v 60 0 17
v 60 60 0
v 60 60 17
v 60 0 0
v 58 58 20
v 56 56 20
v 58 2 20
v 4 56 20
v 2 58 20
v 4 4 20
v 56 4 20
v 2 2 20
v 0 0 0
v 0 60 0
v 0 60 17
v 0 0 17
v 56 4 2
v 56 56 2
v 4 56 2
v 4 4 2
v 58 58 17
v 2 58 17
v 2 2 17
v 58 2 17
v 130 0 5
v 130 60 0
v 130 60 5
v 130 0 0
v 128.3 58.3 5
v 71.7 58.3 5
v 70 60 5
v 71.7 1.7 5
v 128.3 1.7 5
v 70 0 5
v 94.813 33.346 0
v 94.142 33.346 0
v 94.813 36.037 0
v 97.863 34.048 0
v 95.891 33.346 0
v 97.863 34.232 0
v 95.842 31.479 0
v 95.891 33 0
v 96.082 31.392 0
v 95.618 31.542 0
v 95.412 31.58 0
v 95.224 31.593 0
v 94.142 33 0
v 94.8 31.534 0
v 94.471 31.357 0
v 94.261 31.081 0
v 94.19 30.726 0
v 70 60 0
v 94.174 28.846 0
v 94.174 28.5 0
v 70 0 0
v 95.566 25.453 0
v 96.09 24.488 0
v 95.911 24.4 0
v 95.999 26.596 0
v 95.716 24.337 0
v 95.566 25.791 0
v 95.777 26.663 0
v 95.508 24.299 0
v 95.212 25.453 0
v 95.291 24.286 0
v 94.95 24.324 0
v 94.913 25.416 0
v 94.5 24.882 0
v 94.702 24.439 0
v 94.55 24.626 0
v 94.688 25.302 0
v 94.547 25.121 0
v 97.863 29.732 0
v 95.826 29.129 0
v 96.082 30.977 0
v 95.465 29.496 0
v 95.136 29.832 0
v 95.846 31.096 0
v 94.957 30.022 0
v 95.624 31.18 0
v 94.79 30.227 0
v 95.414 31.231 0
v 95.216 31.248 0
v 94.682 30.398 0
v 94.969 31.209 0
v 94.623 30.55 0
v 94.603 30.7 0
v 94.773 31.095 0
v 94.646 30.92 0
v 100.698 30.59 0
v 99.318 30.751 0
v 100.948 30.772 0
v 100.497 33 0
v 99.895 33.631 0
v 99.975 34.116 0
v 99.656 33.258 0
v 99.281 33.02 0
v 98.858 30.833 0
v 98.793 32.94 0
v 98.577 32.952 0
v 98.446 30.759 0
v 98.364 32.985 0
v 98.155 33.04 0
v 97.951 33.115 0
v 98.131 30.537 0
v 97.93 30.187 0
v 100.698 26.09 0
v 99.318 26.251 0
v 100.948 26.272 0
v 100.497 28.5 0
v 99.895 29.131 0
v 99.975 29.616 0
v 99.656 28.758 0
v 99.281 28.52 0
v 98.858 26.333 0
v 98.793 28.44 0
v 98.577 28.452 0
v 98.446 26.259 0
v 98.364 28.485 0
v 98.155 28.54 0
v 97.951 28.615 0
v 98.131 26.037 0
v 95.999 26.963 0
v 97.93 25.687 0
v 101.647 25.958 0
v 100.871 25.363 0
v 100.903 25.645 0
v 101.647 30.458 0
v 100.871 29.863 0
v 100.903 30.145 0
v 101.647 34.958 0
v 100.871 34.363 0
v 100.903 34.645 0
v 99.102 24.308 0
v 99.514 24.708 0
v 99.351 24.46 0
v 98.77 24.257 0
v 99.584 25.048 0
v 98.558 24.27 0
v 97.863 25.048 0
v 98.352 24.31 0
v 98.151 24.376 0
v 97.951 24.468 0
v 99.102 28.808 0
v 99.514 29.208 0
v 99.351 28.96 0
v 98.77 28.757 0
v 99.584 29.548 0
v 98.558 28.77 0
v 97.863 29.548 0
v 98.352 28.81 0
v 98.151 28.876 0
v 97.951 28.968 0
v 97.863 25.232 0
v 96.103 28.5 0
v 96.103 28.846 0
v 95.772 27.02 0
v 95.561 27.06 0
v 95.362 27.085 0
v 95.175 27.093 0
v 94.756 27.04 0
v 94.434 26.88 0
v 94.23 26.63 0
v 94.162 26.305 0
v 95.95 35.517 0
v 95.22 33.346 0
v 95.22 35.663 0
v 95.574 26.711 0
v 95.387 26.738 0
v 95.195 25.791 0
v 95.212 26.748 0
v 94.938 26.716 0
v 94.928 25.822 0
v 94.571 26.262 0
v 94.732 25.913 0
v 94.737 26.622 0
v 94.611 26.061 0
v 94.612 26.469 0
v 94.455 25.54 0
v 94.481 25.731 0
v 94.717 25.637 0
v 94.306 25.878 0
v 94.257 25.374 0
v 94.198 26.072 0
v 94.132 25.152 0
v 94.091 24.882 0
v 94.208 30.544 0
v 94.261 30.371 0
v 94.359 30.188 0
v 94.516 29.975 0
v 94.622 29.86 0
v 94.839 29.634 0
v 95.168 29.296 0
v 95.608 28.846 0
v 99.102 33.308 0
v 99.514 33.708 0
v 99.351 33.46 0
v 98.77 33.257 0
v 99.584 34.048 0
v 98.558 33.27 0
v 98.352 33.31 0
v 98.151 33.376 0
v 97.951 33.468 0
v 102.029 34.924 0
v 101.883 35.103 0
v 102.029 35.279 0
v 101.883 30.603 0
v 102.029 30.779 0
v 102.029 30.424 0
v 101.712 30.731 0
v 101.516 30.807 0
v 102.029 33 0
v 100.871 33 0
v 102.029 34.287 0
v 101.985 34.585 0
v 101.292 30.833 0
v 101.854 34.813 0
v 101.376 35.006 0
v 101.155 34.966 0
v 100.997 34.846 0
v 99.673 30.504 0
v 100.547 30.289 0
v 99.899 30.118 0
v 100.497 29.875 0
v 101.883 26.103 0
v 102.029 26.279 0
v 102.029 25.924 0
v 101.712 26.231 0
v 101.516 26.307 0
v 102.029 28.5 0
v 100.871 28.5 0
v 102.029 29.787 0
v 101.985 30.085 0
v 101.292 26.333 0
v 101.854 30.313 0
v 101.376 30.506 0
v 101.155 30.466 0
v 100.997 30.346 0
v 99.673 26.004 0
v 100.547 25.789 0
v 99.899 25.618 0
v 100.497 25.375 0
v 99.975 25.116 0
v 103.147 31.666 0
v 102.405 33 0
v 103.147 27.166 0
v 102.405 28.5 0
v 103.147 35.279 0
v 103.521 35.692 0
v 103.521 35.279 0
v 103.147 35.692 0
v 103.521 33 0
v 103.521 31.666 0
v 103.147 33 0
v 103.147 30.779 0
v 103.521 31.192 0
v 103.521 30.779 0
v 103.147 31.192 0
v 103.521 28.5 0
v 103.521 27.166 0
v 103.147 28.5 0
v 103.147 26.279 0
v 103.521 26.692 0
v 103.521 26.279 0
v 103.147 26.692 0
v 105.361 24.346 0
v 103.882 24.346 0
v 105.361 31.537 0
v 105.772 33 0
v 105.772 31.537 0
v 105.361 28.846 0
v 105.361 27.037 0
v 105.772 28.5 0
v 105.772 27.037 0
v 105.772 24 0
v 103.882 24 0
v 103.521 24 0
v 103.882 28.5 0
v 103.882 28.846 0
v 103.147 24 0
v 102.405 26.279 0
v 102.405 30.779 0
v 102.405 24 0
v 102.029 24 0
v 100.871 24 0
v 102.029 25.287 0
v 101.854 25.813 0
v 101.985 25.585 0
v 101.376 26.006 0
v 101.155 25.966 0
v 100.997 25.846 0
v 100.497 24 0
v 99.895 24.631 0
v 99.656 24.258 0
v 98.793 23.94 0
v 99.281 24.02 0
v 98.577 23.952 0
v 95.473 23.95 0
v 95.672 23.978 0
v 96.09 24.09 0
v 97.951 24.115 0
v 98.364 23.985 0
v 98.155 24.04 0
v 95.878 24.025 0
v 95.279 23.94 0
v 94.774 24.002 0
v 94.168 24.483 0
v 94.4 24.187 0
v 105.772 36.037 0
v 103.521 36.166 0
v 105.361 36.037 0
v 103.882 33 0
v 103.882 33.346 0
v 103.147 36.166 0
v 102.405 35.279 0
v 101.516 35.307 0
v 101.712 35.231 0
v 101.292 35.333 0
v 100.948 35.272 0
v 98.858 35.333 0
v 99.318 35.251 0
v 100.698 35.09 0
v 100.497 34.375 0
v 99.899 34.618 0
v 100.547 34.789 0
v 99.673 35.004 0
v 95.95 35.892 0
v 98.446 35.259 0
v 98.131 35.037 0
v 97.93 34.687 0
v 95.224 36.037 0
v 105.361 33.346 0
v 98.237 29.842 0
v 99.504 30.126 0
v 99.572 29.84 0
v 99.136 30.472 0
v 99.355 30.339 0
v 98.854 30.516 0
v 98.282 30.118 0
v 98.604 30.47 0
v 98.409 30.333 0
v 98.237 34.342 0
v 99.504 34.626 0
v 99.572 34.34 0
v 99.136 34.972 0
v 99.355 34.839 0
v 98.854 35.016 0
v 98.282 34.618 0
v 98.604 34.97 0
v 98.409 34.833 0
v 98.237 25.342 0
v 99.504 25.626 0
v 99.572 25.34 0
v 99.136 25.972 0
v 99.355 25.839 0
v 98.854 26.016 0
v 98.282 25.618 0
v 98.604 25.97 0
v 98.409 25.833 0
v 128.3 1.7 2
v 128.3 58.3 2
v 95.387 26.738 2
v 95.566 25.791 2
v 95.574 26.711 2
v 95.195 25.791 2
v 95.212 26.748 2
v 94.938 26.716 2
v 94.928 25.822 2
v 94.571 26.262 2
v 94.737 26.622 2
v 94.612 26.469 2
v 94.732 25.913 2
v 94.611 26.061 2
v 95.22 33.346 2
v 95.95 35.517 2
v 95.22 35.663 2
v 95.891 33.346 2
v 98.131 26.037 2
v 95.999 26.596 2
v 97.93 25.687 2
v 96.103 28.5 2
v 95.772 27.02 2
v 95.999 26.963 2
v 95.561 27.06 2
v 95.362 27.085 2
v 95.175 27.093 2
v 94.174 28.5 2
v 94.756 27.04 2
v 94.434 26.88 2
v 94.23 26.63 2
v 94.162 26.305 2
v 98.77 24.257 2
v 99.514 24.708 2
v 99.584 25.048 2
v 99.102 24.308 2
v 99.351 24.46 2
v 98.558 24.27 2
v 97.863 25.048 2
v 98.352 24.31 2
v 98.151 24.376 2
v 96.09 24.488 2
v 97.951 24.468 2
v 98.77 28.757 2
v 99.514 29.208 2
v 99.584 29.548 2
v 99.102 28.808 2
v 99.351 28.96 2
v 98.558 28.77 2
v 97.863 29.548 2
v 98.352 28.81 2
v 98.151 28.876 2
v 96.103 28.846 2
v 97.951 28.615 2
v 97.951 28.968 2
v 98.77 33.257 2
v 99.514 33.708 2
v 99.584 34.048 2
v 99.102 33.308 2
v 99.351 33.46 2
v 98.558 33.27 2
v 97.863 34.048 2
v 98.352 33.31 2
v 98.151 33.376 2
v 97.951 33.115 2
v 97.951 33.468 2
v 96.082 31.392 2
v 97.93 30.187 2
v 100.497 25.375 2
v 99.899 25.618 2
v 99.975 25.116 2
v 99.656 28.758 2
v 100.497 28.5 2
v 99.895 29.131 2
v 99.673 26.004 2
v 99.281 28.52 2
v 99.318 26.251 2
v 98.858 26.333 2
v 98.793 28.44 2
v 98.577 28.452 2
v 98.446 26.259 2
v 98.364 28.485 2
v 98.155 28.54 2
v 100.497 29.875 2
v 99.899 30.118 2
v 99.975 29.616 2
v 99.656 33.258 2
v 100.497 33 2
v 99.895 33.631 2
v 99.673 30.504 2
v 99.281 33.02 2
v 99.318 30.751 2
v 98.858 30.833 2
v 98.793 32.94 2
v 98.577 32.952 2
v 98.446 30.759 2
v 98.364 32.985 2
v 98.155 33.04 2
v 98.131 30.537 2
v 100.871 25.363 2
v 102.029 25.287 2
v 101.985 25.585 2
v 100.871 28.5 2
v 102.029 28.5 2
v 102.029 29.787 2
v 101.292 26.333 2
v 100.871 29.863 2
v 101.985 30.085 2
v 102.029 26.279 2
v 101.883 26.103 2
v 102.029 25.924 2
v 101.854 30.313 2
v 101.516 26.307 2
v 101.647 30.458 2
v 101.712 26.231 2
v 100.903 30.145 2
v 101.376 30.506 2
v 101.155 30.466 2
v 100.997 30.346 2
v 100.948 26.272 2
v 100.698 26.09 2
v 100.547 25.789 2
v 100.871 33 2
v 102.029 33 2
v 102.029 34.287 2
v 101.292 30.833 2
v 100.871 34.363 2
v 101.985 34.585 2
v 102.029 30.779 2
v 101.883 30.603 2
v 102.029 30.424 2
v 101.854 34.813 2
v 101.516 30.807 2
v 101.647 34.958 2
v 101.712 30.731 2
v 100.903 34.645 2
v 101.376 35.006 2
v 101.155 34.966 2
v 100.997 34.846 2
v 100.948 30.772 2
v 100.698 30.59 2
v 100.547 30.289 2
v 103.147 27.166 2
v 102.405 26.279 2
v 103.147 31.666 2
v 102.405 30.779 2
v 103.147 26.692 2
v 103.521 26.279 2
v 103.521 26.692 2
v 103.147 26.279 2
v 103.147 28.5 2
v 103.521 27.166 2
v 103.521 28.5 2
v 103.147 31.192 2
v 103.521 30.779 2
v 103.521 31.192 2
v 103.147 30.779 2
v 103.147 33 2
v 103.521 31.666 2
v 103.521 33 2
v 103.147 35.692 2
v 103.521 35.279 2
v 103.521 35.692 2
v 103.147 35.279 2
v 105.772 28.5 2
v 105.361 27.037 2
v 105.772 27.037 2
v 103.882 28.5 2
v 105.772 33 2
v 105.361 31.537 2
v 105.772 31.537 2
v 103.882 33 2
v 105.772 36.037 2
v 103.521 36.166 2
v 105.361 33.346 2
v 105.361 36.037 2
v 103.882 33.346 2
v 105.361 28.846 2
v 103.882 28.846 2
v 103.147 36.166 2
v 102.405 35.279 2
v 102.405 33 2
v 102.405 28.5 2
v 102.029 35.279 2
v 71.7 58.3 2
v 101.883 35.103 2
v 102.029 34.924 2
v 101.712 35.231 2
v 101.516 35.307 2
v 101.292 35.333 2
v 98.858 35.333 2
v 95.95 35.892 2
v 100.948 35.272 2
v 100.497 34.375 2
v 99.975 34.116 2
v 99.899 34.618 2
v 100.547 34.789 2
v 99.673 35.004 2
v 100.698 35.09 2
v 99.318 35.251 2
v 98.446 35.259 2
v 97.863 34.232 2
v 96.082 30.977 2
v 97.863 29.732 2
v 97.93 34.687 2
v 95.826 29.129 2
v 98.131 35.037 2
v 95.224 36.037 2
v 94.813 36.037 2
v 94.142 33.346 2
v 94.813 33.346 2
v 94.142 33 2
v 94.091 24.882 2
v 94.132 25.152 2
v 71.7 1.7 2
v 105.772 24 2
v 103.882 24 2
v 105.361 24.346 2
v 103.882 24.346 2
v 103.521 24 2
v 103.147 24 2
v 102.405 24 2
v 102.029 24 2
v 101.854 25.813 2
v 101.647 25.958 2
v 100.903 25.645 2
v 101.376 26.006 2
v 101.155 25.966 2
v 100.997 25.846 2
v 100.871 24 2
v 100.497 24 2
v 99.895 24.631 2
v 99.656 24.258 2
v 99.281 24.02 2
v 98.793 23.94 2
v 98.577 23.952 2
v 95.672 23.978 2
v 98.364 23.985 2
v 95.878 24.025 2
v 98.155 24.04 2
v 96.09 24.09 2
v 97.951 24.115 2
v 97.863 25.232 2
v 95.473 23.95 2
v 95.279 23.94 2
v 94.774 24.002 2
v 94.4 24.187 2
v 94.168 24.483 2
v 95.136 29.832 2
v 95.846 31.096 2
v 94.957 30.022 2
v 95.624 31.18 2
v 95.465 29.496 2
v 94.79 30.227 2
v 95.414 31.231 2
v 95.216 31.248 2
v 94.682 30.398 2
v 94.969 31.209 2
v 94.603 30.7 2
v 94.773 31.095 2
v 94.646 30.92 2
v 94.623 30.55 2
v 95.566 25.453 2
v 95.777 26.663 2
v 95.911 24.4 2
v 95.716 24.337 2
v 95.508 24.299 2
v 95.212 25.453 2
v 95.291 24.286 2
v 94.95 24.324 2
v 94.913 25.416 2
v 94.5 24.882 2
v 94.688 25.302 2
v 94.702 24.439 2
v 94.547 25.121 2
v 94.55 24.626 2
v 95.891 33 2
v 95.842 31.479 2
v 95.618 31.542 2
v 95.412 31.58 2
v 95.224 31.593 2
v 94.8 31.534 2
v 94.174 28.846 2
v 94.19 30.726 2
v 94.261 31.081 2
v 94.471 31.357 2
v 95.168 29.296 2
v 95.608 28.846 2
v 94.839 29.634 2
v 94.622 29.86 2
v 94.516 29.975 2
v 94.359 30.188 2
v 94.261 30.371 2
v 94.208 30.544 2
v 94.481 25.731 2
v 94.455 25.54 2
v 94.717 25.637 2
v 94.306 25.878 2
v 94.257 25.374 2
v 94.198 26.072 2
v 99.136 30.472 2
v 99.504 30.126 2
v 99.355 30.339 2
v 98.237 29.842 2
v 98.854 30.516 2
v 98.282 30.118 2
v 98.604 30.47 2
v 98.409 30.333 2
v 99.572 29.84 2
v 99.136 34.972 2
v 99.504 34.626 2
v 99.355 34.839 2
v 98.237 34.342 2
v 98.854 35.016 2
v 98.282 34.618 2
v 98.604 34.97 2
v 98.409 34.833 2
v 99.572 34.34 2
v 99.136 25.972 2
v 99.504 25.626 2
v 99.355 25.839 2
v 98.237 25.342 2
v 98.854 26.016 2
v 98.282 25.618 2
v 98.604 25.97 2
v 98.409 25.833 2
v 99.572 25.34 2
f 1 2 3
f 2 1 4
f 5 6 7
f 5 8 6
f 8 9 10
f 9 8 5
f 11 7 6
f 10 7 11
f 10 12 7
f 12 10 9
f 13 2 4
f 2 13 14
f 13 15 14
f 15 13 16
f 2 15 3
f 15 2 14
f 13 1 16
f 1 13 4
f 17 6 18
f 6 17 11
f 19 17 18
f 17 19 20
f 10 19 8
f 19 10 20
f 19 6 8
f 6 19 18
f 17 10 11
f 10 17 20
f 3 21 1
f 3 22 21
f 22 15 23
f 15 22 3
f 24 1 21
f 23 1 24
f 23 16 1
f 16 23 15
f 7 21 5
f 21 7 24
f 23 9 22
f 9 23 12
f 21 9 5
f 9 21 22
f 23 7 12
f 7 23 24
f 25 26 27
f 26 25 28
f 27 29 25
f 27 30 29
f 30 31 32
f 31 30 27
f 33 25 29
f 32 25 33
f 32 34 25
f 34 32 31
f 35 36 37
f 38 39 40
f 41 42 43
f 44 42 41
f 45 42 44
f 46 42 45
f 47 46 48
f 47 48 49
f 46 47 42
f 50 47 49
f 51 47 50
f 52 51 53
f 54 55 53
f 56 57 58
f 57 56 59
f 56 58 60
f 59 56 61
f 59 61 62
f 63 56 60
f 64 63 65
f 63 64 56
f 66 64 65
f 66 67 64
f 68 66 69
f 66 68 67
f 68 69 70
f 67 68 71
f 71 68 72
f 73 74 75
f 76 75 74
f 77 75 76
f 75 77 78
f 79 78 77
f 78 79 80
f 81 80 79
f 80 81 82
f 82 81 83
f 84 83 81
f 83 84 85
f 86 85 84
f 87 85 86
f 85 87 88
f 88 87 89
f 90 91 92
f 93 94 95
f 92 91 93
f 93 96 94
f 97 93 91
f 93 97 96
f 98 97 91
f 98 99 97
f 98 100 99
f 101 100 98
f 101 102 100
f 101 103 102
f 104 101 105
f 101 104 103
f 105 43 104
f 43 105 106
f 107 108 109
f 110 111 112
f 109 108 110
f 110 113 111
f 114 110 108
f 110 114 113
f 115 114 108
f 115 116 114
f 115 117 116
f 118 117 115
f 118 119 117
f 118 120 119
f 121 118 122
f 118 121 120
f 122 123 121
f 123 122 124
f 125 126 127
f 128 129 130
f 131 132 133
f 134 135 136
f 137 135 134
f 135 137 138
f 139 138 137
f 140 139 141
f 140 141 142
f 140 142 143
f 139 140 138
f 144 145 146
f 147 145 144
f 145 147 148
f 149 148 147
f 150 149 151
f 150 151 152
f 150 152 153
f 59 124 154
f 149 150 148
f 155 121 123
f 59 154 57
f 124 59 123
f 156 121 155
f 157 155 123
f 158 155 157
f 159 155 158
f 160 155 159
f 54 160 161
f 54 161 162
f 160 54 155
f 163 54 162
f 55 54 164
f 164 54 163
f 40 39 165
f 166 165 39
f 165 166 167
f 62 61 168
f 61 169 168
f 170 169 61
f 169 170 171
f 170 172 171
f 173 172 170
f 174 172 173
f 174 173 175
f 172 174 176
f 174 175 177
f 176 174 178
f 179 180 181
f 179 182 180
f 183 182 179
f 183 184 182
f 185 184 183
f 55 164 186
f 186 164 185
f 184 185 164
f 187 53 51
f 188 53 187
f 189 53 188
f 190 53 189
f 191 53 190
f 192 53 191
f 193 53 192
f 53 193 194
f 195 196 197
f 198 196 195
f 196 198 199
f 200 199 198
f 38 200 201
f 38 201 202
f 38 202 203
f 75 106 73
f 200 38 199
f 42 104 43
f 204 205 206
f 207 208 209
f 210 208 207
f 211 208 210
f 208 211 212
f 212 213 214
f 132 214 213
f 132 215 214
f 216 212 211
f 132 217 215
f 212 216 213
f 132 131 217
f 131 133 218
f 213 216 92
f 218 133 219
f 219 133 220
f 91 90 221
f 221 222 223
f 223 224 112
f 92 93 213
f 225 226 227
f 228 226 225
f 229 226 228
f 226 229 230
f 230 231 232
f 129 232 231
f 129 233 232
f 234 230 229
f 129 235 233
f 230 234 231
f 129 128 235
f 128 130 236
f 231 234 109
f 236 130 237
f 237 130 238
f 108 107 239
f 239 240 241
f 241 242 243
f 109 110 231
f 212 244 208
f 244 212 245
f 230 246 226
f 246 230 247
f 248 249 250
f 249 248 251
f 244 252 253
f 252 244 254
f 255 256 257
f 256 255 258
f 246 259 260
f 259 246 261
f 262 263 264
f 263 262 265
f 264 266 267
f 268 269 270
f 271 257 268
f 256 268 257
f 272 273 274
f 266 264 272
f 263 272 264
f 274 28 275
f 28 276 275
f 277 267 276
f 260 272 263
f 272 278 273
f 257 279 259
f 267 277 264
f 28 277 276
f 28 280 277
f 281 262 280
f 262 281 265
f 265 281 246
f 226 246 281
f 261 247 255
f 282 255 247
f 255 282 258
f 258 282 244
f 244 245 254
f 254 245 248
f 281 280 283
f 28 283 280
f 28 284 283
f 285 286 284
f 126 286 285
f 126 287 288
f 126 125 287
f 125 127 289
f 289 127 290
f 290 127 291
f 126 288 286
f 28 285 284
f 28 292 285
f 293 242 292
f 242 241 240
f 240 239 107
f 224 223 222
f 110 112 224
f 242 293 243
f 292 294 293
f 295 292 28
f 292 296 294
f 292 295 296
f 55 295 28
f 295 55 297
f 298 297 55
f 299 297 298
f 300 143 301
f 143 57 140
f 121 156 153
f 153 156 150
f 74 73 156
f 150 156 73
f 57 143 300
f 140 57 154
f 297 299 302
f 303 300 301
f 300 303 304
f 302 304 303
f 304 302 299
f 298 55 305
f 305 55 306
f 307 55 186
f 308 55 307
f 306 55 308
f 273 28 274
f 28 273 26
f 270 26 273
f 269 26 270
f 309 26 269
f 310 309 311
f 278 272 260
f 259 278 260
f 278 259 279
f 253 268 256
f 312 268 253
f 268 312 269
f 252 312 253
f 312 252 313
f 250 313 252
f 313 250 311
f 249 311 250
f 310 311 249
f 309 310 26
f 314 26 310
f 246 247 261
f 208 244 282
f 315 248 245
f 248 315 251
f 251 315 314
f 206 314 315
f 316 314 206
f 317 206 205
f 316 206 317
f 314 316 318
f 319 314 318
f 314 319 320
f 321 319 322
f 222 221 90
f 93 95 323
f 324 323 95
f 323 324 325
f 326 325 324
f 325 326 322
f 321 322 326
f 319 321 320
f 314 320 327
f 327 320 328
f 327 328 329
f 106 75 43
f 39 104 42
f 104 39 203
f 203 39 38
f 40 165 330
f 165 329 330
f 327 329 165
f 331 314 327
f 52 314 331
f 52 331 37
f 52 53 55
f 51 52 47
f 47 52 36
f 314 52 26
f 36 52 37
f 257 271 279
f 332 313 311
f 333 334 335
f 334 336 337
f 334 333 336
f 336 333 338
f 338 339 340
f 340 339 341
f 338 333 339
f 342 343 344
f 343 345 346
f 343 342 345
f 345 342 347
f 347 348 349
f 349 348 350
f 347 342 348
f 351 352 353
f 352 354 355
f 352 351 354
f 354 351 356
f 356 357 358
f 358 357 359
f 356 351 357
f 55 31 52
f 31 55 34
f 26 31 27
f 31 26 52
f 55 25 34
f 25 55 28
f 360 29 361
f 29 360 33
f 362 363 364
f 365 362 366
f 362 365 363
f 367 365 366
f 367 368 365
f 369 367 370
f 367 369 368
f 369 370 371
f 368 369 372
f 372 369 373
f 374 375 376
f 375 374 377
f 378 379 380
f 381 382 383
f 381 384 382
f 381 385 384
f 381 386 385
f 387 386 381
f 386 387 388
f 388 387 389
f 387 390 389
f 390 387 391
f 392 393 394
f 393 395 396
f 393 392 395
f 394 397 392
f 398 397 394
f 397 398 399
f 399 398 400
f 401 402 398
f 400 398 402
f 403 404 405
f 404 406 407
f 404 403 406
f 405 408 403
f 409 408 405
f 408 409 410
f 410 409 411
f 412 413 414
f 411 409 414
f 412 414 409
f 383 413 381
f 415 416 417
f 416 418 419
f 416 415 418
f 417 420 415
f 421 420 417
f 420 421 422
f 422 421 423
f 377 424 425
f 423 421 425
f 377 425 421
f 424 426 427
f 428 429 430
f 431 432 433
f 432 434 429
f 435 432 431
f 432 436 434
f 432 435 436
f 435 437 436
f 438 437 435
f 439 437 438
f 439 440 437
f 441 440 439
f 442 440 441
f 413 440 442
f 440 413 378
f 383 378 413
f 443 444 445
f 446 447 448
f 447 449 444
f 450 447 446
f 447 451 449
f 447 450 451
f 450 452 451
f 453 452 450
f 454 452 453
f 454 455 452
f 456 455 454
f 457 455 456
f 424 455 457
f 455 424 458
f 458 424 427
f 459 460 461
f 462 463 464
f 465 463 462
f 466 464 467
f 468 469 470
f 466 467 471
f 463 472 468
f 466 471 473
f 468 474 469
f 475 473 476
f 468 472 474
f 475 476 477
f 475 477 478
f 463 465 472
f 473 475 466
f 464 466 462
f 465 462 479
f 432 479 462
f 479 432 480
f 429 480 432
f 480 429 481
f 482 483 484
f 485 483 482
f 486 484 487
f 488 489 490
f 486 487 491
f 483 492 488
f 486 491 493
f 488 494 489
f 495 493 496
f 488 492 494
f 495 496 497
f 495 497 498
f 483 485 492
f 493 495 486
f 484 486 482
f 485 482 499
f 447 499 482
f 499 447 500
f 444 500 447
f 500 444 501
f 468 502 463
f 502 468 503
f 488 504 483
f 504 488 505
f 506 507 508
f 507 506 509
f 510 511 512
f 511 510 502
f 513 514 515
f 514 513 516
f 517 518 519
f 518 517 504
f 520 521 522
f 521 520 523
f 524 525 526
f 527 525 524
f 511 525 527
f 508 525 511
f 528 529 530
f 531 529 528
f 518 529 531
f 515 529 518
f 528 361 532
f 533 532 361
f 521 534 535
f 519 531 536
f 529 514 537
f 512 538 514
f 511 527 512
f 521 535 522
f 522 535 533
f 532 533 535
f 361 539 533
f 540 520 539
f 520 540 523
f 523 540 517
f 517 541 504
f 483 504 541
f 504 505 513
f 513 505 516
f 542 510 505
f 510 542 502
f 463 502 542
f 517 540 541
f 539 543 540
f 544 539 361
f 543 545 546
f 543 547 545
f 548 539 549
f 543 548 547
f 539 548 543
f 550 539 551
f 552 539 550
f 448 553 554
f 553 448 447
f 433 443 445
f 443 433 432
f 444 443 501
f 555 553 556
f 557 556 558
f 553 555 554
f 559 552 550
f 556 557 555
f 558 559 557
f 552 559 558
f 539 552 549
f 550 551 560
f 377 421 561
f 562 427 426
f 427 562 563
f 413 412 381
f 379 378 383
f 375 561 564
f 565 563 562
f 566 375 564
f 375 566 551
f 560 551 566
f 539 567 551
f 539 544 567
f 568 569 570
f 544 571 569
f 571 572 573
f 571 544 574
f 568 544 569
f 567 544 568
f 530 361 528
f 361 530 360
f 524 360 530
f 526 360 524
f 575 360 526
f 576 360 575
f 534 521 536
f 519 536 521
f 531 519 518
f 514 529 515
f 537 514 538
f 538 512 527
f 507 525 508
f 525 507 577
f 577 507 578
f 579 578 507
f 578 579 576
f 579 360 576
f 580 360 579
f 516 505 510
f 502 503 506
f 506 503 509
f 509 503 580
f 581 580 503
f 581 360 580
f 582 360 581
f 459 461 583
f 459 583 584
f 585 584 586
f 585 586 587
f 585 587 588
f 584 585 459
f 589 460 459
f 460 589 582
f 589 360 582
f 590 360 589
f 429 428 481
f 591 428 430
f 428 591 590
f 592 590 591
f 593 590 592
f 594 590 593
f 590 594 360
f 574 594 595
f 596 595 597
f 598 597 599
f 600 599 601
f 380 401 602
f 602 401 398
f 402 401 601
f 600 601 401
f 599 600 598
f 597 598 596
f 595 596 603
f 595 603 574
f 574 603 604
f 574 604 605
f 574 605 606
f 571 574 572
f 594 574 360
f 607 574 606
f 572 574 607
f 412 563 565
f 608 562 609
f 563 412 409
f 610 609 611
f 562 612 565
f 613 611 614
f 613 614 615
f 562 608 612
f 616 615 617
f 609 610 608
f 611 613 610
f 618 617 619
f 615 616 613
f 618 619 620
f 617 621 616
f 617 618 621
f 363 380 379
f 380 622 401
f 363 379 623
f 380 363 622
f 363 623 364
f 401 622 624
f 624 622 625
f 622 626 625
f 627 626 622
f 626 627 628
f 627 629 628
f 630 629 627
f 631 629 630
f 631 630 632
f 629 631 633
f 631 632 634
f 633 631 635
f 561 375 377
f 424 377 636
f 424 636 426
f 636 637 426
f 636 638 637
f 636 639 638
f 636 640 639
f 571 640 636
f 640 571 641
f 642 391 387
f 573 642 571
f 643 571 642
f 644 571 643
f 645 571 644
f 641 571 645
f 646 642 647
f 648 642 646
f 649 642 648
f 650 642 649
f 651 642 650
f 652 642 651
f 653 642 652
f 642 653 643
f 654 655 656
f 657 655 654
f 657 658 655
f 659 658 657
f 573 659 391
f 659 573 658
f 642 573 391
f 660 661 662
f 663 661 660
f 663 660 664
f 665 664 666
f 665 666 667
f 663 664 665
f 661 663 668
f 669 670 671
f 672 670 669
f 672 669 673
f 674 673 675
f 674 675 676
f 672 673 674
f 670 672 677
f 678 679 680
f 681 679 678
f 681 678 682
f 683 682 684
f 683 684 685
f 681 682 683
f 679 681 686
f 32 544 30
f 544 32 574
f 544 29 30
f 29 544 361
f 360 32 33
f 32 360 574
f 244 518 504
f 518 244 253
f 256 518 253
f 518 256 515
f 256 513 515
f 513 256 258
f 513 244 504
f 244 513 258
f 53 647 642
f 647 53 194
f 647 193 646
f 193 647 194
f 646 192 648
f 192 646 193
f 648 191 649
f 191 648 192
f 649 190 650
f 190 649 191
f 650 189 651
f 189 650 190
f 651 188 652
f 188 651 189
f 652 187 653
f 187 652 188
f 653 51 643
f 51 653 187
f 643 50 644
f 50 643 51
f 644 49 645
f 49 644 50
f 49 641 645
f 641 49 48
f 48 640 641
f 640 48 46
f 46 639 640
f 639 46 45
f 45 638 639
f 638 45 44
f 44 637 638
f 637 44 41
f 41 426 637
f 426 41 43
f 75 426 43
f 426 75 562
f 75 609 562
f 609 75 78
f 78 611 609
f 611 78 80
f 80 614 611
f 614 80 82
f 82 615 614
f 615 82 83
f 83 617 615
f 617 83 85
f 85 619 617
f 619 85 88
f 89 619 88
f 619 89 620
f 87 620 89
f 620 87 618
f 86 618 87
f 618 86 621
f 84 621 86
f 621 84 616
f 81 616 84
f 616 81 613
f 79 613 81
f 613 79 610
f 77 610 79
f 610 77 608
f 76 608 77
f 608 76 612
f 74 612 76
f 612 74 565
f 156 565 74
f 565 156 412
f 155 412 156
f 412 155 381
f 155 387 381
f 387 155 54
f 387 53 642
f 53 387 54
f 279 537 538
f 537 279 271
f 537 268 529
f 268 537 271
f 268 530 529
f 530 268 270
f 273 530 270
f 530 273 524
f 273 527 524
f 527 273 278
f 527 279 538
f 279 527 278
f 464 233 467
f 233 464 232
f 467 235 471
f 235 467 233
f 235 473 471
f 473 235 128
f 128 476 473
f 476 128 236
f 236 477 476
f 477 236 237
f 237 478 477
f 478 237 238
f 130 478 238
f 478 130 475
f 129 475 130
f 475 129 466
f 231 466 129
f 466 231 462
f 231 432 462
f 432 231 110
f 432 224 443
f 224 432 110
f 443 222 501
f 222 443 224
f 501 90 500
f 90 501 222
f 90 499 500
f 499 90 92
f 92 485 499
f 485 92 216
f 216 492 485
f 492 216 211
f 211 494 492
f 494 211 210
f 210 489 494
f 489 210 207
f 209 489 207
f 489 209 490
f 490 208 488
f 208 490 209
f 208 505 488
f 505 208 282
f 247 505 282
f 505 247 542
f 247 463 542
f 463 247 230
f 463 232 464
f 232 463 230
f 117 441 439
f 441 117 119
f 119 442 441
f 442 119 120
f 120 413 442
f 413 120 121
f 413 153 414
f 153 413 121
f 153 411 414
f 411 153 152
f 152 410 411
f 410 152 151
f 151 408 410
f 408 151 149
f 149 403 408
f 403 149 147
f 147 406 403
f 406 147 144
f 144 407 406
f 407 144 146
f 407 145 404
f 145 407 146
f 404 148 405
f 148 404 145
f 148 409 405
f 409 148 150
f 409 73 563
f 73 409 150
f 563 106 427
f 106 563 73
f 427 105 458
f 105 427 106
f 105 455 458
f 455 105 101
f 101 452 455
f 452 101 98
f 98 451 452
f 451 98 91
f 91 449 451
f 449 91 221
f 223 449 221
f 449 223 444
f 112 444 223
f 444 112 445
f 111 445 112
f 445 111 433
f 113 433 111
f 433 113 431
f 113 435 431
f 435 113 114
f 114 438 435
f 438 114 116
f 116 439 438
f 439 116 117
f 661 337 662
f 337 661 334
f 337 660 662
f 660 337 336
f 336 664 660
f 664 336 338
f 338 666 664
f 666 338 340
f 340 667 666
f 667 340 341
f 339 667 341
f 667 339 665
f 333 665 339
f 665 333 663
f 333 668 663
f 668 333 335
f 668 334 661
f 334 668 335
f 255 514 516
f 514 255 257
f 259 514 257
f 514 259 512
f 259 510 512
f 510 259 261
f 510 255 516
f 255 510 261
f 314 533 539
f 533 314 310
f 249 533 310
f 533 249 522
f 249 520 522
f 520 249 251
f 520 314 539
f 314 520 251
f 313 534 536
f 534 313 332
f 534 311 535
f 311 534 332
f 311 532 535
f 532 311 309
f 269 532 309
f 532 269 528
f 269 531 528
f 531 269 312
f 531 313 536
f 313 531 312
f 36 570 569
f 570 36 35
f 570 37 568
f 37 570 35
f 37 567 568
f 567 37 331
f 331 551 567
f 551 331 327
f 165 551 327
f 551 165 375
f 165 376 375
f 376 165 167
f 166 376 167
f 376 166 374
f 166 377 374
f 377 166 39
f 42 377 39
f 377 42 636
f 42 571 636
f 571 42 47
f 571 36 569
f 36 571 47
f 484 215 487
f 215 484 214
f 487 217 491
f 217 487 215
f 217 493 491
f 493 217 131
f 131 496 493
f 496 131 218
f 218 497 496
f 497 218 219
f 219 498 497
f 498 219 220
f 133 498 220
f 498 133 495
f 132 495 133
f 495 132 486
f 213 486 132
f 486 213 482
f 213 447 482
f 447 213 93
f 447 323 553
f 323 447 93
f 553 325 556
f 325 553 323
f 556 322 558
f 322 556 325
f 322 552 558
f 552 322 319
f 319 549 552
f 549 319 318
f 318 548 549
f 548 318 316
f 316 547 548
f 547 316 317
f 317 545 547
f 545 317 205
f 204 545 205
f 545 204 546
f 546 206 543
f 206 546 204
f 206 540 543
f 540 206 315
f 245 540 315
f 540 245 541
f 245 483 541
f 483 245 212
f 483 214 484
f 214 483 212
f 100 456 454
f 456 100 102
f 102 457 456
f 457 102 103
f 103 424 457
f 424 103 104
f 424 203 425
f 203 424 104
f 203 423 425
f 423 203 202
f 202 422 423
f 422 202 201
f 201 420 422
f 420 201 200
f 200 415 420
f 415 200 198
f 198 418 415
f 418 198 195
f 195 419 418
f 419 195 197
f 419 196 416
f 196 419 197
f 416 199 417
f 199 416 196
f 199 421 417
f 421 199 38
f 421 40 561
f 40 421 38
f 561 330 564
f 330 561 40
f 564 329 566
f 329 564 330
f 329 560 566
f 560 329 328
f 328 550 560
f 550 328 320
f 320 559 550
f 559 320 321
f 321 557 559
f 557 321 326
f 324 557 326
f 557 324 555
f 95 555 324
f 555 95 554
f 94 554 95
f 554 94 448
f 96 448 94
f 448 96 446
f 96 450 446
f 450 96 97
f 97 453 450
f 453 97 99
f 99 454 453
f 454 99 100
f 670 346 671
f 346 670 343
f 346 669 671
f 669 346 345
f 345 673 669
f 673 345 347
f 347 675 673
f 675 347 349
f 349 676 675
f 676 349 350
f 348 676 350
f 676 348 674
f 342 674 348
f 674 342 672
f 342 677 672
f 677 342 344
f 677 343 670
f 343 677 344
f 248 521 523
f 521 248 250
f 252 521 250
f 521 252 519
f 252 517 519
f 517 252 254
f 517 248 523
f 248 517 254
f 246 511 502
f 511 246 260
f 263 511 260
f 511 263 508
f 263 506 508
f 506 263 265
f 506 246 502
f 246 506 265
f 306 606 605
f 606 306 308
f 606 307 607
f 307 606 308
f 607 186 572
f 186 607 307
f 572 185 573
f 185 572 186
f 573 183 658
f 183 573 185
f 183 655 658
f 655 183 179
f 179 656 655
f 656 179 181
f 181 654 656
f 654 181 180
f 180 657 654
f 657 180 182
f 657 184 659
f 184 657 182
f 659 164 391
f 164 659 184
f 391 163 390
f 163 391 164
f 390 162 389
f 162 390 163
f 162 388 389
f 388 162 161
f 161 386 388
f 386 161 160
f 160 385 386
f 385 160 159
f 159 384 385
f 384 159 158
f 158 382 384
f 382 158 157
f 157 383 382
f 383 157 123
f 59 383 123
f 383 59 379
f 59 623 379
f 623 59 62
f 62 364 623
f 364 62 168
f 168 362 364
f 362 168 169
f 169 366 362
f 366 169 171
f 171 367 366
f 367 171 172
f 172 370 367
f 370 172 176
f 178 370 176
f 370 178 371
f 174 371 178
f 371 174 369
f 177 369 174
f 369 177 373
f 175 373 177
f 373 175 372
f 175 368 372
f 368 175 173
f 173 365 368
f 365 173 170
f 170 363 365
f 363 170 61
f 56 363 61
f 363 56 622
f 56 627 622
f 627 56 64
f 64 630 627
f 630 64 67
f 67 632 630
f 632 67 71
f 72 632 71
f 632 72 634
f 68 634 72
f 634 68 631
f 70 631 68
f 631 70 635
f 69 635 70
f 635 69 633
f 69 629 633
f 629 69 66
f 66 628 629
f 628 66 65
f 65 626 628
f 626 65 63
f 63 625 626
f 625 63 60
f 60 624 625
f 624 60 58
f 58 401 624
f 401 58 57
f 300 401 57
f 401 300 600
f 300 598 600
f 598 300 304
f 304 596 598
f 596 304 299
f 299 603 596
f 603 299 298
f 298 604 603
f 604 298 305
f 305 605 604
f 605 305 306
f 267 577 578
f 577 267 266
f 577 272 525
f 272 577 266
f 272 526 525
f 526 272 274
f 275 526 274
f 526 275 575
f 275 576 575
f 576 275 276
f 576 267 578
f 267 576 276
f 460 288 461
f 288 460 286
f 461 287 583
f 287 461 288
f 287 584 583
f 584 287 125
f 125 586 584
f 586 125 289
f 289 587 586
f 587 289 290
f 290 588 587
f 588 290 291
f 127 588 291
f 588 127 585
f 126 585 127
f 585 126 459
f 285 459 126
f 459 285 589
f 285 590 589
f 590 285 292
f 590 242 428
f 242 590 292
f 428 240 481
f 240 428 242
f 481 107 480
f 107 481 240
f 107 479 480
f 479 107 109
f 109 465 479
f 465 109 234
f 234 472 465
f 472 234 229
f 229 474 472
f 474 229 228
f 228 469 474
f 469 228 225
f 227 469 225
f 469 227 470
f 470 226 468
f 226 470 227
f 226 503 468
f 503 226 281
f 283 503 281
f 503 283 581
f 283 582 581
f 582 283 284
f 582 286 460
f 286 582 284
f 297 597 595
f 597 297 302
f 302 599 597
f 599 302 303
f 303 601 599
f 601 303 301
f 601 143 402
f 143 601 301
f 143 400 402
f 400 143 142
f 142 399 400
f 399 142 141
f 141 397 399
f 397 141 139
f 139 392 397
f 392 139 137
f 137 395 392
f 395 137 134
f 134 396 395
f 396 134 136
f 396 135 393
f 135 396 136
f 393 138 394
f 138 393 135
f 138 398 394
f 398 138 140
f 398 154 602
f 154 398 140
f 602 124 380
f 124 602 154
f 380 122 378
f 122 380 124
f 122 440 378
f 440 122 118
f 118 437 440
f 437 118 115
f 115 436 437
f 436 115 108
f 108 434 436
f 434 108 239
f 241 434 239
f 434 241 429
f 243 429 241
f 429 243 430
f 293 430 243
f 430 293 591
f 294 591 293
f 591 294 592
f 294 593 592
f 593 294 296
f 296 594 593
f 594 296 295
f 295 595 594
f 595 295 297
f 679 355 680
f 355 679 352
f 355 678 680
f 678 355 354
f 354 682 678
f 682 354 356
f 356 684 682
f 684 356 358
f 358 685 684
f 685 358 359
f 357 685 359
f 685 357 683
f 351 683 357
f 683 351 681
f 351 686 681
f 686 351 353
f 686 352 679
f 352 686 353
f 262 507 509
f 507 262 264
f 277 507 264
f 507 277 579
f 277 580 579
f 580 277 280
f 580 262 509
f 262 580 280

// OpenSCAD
//Choose width of the box
width=60; //[10:1:300]
//Choose length of the box
length=60; //[10:1:300]
//Choose heigth of the box
heigth=20; //[10:.5:300]
//Choose bottom thikness of the box
bottom=2; // [1:1:6]
//Choose the wall thickness of the box
wall=4; //[1:..5:6]
//Choose the height of the top
top_heigth=3;//[1:.5:150]
//Choose the tolerance between top and bottom part
tolerance=.6; //[0:.05:1]

    // Enter your text Line 1
    text_box1 = "Line 1";
    // Enter your text Line 1
    text_box2 = "Line 2";
    // Enter your text Line 1
    text_box3= "Line 3";
    // Enter text size
    text_size= 3;




difference(){  
//difference outer shell
difference(){  
//OUTER SHELL  
  cube([width,length,heigth]);
translate([wall,wall,bottom])
cube ([width-2*wall,length-2*wall,heigth]);
}
    
difference () {
//INNER SHELL
translate([0,0, heigth-top_heigth])
cube([width, length, top_heigth]);
translate([wall/2,wall/2, heigth-top_heigth])
cube([width-(wall), length-wall, top_heigth]);
}    
}
//TOP
difference () {

translate([width+10,0, 0])
cube([width, length, bottom+top_heigth]);
translate([width+10+(wall/2)-tolerance/2,(wall/2)-tolerance/2,bottom])
cube([width-wall+tolerance, length-wall + tolerance, top_heigth]);
//TEXT DIFFERENCE
    
font1 = "Archivo Black"; // here you can select other font type


translate ([width*1.5+10,length/2-(text_size/2),heigth]) {
rotate([0,180,0])
linear_extrude(height = 60) {
text(text_box2, font = font1, size = text_size, halign="center",  direction = "ltr", spacing = 1 );
    ;
}}
translate ([width*1.5+10,length/2+(text_size/2)*2,heigth]) {
rotate([0,180,0])
linear_extrude(height = 60) {
text(text_box1, font = font1, size = text_size, halign="center",  direction = "ltr", spacing = 1 );
    ;
}}
translate ([width*1.5+10,length/2-(text_size*2),heigth]) {
rotate([0,180,0])
linear_extrude(height = 60) {
text(text_box3, font = font1, size = text_size, halign="center",  direction = "ltr", spacing = 1 );
    ;
}}



}
//}

//text difference end
//}
//}
